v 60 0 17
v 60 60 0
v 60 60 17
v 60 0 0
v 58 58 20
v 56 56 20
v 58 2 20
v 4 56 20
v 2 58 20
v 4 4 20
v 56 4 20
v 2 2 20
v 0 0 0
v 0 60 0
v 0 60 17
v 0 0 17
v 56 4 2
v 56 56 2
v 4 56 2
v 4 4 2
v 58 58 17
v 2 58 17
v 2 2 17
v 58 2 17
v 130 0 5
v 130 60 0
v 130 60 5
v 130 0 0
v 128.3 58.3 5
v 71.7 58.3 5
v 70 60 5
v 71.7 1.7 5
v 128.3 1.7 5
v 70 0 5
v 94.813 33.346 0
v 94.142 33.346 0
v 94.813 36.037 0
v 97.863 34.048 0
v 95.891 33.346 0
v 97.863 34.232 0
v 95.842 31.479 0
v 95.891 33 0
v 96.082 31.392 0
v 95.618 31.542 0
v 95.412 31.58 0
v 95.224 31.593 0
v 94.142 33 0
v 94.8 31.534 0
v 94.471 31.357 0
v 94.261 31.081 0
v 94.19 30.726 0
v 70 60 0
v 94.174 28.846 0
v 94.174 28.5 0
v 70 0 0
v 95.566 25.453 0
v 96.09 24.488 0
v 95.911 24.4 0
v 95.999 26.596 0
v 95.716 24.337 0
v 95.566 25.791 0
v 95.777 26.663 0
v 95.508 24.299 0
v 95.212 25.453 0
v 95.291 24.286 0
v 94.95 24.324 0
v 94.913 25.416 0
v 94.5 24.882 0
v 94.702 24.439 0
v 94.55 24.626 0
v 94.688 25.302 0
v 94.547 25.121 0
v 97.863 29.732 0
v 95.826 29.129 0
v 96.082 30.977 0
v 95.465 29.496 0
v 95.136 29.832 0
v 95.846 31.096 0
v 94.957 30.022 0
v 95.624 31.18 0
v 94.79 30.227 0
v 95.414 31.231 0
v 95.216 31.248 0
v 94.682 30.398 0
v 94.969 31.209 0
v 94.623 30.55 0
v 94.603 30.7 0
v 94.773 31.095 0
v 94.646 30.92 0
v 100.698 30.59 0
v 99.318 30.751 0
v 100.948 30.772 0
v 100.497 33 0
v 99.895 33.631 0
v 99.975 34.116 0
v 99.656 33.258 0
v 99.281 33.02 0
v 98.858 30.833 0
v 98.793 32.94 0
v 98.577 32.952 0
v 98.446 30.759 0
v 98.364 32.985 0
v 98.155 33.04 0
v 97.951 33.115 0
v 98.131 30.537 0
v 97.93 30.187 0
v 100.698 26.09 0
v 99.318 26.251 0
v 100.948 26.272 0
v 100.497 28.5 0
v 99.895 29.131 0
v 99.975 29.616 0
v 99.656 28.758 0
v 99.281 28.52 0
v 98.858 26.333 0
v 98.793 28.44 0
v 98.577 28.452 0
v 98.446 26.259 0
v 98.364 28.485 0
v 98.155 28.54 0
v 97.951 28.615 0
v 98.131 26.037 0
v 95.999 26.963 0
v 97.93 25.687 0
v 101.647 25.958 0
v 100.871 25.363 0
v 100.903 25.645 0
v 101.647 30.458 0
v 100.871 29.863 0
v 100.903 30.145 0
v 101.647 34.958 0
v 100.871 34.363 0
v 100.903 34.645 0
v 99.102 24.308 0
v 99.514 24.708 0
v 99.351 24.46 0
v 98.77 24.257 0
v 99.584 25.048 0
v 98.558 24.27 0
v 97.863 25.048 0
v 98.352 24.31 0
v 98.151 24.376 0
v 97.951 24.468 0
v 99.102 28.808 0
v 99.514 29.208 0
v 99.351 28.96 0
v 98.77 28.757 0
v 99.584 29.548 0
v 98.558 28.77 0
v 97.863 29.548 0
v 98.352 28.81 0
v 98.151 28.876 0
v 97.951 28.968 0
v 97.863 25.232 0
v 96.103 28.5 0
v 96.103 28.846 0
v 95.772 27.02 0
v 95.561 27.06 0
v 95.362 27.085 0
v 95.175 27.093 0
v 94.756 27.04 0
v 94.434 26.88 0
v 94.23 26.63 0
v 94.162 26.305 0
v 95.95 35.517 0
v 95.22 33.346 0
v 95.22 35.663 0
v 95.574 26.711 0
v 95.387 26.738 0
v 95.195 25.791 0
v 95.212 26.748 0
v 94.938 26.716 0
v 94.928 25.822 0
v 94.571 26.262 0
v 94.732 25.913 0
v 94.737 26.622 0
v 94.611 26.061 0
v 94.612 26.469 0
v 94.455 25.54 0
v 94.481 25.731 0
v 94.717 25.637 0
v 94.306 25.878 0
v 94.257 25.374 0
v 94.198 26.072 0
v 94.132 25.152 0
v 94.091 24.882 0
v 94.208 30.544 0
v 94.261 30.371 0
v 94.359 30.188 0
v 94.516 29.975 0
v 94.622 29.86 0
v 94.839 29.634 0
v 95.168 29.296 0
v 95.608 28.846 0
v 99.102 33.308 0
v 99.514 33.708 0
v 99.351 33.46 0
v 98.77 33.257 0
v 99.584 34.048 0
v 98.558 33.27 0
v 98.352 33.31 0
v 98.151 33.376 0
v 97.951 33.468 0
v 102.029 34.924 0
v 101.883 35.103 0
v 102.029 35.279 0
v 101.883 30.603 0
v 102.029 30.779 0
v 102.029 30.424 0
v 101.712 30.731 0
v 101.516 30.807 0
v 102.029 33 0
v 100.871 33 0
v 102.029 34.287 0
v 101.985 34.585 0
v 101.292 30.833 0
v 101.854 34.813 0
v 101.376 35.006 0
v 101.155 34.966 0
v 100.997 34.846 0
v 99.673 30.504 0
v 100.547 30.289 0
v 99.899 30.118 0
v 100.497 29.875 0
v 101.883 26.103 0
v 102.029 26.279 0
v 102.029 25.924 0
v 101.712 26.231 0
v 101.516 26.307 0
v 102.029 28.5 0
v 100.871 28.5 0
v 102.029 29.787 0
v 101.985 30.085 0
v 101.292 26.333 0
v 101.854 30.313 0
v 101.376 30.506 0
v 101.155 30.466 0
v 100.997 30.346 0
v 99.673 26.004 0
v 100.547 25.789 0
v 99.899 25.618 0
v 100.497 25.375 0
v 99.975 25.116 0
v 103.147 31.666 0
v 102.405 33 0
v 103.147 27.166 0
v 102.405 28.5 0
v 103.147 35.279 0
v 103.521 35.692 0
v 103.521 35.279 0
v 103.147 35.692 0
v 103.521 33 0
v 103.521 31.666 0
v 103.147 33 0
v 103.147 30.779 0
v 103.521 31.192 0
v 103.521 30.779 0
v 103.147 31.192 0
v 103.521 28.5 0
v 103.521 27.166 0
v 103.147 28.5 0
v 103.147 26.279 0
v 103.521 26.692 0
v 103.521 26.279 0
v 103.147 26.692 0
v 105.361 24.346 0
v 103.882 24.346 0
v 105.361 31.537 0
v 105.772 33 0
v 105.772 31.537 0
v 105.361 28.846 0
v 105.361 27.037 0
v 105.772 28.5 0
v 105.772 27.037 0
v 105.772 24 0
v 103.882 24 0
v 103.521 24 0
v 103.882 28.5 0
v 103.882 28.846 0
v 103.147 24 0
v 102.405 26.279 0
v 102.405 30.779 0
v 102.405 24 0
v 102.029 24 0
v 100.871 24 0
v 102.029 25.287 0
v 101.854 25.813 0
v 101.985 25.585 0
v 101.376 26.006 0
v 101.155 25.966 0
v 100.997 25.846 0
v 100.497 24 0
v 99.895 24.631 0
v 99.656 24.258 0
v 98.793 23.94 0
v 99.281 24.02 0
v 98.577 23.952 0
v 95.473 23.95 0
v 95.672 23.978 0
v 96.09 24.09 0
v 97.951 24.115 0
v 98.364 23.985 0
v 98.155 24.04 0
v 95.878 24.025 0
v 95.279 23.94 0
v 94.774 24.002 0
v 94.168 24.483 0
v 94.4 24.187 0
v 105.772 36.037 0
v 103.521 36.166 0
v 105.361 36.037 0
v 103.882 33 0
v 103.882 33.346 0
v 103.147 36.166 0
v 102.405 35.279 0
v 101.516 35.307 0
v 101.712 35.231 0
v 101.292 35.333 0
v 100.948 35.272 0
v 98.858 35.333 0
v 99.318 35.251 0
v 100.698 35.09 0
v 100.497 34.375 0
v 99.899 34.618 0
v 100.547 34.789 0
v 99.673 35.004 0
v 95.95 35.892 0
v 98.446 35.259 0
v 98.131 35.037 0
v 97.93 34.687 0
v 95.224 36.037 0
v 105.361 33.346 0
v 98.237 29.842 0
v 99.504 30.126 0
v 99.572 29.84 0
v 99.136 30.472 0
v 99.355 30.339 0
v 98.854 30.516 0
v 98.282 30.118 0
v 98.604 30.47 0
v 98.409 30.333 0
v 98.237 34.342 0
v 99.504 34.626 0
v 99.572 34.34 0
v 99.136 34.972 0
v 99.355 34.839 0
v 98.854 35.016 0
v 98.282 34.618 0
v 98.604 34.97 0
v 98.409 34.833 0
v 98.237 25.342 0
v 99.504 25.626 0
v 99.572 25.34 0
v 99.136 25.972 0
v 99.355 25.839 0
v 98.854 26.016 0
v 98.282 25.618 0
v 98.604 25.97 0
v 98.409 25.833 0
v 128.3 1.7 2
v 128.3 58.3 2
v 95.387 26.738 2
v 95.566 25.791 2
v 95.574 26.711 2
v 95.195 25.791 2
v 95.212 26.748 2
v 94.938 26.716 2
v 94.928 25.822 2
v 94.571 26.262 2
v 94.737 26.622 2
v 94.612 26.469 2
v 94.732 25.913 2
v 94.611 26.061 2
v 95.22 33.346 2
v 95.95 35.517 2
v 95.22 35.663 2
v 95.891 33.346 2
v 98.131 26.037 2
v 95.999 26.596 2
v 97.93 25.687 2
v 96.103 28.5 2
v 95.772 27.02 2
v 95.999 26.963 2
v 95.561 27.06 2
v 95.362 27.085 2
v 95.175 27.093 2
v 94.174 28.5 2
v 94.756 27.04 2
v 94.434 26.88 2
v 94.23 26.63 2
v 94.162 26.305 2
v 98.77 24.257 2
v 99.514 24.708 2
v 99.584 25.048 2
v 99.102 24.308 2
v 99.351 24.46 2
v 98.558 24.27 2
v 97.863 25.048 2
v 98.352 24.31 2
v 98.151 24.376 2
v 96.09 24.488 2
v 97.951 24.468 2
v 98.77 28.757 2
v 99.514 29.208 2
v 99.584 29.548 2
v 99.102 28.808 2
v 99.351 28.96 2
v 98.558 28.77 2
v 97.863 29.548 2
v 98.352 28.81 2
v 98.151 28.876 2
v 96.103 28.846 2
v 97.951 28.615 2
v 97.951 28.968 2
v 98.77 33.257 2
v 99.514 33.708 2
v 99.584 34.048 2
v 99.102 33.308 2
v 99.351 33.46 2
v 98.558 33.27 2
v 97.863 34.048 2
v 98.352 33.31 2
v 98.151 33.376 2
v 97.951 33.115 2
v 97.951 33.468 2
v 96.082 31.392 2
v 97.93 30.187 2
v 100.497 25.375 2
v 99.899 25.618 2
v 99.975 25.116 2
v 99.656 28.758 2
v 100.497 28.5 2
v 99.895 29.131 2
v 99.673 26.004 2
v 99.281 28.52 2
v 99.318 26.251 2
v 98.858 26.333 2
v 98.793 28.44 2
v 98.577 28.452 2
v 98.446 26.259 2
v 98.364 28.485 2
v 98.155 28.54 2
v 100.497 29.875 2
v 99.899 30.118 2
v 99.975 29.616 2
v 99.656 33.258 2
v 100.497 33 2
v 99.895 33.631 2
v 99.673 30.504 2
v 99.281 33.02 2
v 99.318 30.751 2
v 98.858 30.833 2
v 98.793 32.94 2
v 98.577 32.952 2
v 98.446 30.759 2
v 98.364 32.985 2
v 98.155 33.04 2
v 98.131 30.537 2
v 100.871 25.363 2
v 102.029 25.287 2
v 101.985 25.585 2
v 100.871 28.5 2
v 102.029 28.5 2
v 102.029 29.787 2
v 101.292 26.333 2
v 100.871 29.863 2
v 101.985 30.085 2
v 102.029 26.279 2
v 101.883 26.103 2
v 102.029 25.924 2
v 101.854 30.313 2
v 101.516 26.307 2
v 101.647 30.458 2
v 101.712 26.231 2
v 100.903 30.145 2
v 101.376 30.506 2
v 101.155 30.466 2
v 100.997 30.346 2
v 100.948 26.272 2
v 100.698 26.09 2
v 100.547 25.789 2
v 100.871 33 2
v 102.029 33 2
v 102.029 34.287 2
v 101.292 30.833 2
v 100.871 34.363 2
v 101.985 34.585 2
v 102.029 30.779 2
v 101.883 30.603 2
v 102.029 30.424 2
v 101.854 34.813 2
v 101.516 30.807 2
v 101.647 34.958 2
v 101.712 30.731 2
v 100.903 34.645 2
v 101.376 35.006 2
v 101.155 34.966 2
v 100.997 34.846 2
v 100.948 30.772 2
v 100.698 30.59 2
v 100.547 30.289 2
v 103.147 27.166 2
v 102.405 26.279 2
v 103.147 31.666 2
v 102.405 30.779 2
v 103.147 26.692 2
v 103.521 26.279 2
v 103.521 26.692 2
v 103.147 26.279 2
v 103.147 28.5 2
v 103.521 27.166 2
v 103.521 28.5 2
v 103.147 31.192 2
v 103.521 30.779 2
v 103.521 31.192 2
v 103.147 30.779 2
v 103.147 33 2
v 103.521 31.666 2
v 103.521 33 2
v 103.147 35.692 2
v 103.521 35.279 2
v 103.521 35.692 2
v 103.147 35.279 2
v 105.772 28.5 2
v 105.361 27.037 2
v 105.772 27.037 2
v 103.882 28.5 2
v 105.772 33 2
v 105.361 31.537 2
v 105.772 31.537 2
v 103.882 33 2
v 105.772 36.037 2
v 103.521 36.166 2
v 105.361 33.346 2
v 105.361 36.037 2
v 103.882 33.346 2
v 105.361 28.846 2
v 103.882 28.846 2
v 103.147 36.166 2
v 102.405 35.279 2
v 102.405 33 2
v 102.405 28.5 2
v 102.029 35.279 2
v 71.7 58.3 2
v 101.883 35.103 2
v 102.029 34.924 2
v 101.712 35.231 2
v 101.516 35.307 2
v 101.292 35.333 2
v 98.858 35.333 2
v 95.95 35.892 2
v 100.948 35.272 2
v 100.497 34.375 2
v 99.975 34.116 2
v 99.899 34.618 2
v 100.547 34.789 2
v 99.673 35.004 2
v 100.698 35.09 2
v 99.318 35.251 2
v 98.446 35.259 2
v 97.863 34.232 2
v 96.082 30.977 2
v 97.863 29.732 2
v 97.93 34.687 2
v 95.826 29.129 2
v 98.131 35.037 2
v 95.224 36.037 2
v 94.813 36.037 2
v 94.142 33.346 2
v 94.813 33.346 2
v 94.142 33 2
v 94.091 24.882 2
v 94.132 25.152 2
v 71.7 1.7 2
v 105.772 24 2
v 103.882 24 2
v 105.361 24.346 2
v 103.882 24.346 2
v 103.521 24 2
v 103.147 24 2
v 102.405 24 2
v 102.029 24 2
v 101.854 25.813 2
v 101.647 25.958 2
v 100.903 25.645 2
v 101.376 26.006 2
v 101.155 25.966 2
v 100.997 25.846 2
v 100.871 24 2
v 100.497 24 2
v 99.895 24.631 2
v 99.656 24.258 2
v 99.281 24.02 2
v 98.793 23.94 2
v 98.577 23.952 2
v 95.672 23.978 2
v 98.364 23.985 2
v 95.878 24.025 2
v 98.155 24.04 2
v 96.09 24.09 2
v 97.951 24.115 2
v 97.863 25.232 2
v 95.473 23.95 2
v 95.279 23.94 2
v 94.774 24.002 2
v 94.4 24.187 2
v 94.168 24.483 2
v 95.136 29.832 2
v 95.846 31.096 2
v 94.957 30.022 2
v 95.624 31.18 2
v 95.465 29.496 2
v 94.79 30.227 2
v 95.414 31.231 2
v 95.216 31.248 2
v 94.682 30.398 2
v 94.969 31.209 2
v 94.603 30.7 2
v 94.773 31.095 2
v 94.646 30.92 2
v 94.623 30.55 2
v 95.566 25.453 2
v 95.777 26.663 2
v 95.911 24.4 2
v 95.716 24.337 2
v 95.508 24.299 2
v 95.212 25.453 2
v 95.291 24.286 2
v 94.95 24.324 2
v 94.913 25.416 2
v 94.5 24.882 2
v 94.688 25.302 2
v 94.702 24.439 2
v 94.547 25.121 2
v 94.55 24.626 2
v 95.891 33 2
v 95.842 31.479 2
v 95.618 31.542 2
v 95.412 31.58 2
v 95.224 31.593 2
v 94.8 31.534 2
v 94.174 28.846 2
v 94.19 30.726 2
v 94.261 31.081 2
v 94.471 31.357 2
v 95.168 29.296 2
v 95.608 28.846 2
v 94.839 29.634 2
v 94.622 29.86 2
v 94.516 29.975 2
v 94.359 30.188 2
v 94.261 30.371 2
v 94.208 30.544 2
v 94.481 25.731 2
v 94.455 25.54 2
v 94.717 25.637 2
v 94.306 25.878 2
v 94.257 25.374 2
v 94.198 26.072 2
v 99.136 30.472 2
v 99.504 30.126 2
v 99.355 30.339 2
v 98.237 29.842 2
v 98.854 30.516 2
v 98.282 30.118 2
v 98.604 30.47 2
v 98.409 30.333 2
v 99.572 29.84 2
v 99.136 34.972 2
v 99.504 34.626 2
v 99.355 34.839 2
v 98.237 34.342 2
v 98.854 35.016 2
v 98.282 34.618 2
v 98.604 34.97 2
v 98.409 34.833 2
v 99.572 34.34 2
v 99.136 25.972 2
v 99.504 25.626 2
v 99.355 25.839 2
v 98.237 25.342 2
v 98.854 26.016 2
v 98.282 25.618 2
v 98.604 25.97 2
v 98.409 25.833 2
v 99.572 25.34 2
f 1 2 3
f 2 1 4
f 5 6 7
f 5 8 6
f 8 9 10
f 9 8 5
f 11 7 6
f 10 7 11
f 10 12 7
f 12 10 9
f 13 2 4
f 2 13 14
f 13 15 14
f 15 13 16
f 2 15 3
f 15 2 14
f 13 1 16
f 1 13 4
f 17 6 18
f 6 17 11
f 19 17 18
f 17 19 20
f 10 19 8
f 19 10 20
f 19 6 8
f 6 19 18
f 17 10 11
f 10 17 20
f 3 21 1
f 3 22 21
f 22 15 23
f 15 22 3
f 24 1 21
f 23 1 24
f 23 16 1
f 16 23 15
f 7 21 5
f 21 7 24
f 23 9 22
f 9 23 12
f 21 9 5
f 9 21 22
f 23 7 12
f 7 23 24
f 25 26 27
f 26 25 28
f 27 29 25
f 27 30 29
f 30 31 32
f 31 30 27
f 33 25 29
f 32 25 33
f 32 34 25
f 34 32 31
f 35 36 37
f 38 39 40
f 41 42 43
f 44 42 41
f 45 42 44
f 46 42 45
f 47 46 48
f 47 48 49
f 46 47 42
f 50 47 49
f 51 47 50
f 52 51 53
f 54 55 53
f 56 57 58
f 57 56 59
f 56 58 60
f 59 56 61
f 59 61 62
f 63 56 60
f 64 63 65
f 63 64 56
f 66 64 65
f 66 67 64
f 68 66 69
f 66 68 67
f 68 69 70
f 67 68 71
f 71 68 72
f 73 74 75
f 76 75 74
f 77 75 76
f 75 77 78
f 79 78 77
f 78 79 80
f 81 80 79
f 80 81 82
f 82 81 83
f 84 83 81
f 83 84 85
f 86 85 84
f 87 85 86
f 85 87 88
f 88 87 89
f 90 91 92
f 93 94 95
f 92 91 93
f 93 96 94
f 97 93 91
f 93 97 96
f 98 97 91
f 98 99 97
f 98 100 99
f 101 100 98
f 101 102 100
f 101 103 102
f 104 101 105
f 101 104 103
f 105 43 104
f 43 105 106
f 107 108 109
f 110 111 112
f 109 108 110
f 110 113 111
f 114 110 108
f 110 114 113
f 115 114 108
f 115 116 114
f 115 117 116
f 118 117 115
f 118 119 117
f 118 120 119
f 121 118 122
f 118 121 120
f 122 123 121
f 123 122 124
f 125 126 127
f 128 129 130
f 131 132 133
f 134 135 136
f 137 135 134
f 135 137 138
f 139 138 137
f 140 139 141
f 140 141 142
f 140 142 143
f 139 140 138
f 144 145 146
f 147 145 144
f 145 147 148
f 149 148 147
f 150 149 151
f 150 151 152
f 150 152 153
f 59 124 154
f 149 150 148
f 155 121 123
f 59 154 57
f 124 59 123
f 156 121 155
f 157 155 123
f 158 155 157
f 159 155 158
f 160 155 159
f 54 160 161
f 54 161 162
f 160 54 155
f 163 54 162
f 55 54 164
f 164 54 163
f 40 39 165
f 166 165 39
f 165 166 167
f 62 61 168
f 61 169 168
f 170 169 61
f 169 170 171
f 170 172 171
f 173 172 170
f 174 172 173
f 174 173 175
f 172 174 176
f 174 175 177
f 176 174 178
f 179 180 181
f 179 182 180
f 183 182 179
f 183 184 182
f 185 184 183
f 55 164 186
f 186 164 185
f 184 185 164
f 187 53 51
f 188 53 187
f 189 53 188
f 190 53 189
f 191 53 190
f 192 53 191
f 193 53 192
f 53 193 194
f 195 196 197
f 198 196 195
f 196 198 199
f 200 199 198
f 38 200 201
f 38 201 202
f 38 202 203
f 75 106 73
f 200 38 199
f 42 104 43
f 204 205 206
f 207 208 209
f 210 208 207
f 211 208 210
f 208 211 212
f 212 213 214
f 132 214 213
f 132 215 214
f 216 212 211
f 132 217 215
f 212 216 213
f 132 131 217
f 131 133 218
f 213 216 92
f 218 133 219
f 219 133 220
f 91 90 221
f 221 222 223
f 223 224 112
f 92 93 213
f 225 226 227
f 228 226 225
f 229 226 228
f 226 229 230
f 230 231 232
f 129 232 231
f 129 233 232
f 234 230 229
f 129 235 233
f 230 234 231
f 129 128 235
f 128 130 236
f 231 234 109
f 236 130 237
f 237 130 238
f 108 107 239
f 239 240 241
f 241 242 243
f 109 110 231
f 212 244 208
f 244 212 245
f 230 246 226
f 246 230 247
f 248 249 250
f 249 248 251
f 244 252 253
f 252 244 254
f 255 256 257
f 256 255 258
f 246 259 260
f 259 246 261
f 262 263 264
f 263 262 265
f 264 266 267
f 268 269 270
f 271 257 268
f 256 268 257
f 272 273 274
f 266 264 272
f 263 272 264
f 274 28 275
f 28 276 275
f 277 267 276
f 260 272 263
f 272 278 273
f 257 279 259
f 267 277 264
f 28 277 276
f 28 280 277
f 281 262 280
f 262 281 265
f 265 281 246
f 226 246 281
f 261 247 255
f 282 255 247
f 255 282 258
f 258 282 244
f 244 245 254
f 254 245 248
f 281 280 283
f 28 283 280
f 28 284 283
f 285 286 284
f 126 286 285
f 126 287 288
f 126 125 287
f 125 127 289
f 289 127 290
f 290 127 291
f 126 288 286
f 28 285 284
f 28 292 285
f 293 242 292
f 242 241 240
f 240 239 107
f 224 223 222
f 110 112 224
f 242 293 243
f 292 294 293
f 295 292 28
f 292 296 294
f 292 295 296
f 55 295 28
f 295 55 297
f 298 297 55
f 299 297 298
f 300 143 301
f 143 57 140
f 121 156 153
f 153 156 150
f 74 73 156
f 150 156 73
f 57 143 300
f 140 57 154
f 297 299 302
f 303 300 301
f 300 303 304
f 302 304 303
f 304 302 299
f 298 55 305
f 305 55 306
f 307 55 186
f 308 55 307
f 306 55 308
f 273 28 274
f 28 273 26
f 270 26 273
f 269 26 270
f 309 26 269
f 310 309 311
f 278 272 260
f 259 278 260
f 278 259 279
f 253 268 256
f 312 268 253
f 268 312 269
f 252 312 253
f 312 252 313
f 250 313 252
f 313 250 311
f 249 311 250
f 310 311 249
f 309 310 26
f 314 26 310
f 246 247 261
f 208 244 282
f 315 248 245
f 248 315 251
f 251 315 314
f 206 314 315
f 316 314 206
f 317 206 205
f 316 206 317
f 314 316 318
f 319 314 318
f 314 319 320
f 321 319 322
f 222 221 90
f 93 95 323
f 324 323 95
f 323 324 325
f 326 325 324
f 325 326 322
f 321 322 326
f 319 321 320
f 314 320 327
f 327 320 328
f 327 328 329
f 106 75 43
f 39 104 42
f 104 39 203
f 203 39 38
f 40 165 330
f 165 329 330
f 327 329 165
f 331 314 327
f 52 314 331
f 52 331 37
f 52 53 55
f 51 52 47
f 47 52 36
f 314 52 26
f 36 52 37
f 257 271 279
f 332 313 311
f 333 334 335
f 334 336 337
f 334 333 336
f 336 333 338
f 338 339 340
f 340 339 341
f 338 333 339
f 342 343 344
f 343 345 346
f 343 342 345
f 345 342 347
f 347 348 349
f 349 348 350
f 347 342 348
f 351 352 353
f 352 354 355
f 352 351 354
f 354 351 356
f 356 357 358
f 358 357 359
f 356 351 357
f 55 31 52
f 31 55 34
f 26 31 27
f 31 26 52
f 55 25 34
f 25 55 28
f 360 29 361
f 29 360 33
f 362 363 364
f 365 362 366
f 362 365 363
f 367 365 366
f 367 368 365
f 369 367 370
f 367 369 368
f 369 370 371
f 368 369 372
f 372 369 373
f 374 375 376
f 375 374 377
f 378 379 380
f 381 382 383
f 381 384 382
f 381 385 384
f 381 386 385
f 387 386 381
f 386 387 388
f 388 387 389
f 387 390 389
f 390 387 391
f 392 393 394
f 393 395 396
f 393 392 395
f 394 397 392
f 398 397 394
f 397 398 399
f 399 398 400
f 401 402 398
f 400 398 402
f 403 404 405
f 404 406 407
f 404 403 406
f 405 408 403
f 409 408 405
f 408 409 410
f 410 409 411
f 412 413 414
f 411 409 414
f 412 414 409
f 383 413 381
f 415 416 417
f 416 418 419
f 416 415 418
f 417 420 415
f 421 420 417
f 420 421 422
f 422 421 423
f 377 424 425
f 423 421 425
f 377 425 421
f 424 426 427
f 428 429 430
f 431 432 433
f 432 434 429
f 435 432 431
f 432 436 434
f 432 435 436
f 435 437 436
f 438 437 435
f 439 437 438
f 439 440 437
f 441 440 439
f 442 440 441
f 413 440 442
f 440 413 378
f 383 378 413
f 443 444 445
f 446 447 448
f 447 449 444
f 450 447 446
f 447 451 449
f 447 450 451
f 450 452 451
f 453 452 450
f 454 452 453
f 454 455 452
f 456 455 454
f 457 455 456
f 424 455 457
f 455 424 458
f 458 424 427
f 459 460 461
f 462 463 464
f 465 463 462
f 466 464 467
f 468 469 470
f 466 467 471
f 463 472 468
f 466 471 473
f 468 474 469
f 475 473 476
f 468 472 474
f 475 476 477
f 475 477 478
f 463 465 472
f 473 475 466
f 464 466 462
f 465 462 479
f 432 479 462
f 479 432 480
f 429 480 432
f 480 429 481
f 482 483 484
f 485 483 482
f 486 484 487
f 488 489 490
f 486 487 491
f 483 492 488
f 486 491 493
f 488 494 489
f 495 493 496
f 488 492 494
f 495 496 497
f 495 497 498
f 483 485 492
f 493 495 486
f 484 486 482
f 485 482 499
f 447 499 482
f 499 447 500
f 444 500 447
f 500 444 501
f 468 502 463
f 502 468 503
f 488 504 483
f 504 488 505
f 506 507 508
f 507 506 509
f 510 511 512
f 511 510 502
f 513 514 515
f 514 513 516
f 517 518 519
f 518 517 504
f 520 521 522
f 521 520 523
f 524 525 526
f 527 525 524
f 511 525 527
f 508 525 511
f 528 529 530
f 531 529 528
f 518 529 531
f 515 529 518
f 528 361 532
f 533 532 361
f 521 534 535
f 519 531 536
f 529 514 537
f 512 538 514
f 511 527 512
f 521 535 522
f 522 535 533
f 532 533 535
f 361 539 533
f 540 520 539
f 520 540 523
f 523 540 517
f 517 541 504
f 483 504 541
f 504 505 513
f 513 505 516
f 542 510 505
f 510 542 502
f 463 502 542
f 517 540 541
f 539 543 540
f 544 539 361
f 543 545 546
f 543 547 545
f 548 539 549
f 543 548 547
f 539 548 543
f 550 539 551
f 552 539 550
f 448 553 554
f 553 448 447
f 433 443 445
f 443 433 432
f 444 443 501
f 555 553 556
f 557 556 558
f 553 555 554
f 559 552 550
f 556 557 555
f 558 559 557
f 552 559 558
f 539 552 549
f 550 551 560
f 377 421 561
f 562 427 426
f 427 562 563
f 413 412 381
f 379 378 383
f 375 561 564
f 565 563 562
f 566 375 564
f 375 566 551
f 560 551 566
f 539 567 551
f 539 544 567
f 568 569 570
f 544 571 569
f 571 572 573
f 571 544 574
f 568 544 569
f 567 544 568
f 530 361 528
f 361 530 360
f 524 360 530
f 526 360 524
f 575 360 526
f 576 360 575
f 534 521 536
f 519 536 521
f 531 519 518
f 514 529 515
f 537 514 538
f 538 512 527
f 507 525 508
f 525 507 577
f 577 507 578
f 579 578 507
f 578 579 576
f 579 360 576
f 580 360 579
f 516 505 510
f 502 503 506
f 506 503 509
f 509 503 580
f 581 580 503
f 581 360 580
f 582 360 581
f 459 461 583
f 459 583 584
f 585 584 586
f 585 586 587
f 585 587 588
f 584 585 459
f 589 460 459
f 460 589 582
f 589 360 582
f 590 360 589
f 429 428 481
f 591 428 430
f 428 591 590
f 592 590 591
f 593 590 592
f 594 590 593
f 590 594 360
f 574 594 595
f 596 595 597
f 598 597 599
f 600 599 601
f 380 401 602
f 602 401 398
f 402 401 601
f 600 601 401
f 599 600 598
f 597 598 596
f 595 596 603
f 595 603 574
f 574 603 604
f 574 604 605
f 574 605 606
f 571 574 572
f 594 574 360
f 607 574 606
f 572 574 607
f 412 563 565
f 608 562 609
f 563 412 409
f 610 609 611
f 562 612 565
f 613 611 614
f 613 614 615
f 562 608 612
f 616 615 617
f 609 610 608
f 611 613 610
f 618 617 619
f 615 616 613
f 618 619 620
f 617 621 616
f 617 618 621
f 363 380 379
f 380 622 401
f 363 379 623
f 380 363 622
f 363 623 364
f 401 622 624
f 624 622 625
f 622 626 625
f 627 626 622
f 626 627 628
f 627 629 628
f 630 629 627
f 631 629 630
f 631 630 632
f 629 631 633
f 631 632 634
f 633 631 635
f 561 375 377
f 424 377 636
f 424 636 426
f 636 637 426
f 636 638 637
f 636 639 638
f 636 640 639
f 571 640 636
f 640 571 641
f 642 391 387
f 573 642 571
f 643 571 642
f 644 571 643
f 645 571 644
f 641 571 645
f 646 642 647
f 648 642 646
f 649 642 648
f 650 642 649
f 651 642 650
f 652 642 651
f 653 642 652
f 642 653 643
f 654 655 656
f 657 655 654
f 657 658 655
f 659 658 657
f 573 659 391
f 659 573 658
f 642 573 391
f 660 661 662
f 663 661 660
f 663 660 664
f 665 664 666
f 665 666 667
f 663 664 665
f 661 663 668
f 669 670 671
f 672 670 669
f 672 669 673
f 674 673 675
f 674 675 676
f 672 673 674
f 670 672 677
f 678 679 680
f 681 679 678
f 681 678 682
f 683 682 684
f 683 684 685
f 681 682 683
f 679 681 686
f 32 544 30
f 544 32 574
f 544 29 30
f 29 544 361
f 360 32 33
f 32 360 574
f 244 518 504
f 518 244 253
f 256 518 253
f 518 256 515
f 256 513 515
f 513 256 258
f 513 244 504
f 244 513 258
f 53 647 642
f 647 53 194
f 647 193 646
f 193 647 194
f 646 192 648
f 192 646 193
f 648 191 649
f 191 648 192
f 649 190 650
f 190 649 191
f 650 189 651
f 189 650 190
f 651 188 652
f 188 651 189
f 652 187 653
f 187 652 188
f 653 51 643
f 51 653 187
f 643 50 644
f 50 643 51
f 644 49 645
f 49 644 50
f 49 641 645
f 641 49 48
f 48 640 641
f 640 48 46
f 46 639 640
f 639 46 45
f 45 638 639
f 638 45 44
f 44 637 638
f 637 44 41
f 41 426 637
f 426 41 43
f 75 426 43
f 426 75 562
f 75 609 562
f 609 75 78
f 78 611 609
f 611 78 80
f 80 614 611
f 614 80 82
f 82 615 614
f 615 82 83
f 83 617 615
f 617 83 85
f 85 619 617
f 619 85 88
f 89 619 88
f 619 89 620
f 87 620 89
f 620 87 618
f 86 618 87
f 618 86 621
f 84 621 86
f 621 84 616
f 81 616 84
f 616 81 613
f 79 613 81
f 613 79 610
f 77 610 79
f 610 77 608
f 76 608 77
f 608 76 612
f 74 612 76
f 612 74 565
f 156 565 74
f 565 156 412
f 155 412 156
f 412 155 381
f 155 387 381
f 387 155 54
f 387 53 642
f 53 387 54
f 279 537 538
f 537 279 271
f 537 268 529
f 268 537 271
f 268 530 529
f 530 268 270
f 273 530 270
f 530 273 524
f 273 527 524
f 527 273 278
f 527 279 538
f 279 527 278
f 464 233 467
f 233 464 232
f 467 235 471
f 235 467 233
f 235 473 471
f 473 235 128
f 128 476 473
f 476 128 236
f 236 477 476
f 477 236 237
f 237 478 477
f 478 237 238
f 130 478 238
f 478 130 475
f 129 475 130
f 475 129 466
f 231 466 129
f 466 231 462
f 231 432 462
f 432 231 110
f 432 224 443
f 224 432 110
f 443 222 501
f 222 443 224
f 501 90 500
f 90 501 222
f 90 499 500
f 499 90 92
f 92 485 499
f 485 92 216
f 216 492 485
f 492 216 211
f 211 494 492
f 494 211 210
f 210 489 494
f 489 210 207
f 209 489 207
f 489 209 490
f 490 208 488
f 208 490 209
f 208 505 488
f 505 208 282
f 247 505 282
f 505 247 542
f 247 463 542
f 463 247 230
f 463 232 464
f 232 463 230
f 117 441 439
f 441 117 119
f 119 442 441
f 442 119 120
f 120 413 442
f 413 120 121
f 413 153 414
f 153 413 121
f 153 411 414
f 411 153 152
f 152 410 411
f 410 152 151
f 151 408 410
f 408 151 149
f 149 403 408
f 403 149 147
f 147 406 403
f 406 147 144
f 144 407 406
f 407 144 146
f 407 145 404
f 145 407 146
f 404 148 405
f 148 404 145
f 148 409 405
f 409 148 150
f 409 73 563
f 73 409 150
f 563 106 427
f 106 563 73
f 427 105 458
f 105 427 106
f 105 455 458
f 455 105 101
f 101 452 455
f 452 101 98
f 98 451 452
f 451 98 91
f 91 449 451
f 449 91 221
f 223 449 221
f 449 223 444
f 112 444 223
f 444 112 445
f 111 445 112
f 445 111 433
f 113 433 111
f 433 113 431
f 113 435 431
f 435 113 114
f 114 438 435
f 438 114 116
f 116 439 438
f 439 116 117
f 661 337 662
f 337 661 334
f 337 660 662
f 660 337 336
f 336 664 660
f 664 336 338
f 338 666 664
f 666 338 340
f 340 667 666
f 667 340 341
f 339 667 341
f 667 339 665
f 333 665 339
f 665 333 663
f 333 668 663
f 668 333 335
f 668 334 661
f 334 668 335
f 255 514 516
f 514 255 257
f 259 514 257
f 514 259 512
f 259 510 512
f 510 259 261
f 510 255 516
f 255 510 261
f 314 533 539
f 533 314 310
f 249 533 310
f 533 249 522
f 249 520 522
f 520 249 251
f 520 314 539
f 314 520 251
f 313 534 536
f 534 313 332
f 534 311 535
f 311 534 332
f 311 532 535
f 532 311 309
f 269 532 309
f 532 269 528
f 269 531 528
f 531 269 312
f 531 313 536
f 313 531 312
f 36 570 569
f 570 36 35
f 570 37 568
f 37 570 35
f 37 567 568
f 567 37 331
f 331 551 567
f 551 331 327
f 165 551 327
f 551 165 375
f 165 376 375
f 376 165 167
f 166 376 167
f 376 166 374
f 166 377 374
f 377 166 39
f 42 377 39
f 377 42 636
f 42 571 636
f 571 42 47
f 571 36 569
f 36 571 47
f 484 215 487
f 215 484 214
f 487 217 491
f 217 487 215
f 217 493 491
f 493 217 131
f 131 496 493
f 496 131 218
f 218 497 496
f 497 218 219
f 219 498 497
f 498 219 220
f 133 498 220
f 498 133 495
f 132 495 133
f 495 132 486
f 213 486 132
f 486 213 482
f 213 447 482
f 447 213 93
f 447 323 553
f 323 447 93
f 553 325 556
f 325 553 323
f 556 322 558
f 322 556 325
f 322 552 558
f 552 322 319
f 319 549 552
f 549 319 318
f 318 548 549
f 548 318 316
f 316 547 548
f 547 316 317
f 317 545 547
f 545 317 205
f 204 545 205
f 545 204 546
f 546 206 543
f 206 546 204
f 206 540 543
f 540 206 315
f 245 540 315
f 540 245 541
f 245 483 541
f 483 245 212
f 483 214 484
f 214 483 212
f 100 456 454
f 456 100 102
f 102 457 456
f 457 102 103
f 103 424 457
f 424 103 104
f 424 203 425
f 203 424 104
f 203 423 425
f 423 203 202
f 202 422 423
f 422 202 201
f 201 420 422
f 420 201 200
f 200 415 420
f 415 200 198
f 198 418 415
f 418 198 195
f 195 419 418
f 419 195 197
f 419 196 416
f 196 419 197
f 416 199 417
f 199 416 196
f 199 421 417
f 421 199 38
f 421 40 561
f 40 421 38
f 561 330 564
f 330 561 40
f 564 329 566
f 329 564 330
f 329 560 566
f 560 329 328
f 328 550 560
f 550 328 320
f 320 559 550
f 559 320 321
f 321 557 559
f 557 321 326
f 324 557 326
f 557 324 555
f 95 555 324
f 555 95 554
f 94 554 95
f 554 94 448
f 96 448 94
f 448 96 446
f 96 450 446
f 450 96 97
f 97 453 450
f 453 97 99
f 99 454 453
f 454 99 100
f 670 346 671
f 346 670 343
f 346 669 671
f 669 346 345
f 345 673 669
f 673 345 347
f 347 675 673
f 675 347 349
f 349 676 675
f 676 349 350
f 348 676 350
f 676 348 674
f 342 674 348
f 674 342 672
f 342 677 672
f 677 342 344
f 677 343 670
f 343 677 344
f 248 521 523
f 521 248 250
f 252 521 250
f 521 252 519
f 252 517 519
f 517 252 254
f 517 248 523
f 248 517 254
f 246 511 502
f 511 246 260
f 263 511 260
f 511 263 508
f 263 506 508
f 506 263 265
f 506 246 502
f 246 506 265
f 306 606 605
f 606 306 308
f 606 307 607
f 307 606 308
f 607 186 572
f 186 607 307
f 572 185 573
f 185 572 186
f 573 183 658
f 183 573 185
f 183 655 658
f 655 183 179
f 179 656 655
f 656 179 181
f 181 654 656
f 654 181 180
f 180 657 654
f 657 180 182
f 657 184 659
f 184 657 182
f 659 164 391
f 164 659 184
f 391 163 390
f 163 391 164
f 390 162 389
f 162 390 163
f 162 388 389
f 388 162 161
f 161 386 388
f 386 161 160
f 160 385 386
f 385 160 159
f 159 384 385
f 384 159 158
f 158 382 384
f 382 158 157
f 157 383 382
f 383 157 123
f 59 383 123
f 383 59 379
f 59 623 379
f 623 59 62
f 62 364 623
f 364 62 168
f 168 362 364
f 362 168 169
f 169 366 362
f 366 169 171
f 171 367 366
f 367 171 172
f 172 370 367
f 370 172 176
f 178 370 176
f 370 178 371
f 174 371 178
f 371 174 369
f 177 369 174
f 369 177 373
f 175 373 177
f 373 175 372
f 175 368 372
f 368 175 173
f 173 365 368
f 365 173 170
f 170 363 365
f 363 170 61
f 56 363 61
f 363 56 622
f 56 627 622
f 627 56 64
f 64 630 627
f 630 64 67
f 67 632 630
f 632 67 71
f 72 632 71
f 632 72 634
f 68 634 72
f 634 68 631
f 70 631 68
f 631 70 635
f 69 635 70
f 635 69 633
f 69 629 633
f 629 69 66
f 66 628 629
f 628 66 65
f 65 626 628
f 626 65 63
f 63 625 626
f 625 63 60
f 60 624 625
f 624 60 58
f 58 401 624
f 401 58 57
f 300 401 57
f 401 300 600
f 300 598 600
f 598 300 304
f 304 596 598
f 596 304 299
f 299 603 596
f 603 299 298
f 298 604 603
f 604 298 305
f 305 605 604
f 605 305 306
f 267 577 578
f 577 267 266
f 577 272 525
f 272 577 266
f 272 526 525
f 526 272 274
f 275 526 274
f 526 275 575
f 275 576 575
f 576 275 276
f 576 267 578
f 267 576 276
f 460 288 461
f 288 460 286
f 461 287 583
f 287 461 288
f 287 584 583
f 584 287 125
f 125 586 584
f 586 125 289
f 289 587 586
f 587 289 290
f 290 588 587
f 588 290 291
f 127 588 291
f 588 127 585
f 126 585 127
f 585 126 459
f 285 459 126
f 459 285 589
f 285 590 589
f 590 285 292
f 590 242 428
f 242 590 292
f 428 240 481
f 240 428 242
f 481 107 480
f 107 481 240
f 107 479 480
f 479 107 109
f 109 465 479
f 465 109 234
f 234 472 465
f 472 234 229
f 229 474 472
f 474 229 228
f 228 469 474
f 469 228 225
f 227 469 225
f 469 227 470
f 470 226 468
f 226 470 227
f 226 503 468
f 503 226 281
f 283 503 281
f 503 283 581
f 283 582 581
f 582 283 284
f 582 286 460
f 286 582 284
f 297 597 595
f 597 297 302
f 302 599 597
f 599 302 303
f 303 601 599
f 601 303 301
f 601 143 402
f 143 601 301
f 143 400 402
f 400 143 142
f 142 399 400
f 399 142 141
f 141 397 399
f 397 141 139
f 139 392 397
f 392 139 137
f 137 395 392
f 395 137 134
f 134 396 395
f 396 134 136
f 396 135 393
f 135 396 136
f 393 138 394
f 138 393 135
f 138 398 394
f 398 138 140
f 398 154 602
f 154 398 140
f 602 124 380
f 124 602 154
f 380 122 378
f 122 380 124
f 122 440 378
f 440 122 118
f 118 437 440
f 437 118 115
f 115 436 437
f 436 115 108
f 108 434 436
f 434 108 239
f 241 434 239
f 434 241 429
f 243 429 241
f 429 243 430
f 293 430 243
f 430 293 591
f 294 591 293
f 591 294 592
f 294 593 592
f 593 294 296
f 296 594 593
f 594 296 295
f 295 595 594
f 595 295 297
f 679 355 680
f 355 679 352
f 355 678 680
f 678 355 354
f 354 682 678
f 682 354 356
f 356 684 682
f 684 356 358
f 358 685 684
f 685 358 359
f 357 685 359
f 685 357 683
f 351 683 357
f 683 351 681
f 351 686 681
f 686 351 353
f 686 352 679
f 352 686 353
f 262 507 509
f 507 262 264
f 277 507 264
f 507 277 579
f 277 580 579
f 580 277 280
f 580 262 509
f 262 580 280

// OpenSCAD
//Choose width of the box
width=60; //[10:1:300]
//Choose length of the box
length=60; //[10:1:300]
//Choose heigth of the box
heigth=20; //[10:.5:300]
//Choose bottom thikness of the box
bottom=2; // [1:1:6]
//Choose the wall thickness of the box
wall=4; //[1:..5:6]
//Choose the height of the top
top_heigth=3;//[1:.5:150]
//Choose the tolerance between top and bottom part
tolerance=.6; //[0:.05:1]

    // Enter your text Line 1
    text_box1 = "Line 1";
    // Enter your text Line 1
    text_box2 = "Line 2";
    // Enter your text Line 1
    text_box3= "Line 3";
    // Enter text size
    text_size= 3;




difference(){  
//difference outer shell
difference(){  
//OUTER SHELL  
  cube([width,length,heigth]);
translate([wall,wall,bottom])
cube ([width-2*wall,length-2*wall,heigth]);
}
    
difference () {
//INNER SHELL
translate([0,0, heigth-top_heigth])
cube([width, length, top_heigth]);
translate([wall/2,wall/2, heigth-top_heigth])
cube([width-(wall), length-wall, top_heigth]);
}    
}
//TOP
difference () {

translate([width+10,0, 0])
cube([width, length, bottom+top_heigth]);
translate([width+10+(wall/2)-tolerance/2,(wall/2)-tolerance/2,bottom])
cube([width-wall+tolerance, length-wall + tolerance, top_heigth]);
//TEXT DIFFERENCE
    
font1 = "Archivo Black"; // here you can select other font type


translate ([width*1.5+10,length/2-(text_size/2),heigth]) {
rotate([0,180,0])
linear_extrude(height = 60) {
text(text_box2, font = font1, size = text_size, halign="center",  direction = "ltr", spacing = 1 );
    ;
}}
translate ([width*1.5+10,length/2+(text_size/2)*2,heigth]) {
rotate([0,180,0])
linear_extrude(height = 60) {
text(text_box1, font = font1, size = text_size, halign="center",  direction = "ltr", spacing = 1 );
    ;
}}
translate ([width*1.5+10,length/2-(text_size*2),heigth]) {
rotate([0,180,0])
linear_extrude(height = 60) {
text(text_box3, font = font1, size = text_size, halign="center",  direction = "ltr", spacing = 1 );
    ;
}}



}
//}

//text difference end
//}
//}
